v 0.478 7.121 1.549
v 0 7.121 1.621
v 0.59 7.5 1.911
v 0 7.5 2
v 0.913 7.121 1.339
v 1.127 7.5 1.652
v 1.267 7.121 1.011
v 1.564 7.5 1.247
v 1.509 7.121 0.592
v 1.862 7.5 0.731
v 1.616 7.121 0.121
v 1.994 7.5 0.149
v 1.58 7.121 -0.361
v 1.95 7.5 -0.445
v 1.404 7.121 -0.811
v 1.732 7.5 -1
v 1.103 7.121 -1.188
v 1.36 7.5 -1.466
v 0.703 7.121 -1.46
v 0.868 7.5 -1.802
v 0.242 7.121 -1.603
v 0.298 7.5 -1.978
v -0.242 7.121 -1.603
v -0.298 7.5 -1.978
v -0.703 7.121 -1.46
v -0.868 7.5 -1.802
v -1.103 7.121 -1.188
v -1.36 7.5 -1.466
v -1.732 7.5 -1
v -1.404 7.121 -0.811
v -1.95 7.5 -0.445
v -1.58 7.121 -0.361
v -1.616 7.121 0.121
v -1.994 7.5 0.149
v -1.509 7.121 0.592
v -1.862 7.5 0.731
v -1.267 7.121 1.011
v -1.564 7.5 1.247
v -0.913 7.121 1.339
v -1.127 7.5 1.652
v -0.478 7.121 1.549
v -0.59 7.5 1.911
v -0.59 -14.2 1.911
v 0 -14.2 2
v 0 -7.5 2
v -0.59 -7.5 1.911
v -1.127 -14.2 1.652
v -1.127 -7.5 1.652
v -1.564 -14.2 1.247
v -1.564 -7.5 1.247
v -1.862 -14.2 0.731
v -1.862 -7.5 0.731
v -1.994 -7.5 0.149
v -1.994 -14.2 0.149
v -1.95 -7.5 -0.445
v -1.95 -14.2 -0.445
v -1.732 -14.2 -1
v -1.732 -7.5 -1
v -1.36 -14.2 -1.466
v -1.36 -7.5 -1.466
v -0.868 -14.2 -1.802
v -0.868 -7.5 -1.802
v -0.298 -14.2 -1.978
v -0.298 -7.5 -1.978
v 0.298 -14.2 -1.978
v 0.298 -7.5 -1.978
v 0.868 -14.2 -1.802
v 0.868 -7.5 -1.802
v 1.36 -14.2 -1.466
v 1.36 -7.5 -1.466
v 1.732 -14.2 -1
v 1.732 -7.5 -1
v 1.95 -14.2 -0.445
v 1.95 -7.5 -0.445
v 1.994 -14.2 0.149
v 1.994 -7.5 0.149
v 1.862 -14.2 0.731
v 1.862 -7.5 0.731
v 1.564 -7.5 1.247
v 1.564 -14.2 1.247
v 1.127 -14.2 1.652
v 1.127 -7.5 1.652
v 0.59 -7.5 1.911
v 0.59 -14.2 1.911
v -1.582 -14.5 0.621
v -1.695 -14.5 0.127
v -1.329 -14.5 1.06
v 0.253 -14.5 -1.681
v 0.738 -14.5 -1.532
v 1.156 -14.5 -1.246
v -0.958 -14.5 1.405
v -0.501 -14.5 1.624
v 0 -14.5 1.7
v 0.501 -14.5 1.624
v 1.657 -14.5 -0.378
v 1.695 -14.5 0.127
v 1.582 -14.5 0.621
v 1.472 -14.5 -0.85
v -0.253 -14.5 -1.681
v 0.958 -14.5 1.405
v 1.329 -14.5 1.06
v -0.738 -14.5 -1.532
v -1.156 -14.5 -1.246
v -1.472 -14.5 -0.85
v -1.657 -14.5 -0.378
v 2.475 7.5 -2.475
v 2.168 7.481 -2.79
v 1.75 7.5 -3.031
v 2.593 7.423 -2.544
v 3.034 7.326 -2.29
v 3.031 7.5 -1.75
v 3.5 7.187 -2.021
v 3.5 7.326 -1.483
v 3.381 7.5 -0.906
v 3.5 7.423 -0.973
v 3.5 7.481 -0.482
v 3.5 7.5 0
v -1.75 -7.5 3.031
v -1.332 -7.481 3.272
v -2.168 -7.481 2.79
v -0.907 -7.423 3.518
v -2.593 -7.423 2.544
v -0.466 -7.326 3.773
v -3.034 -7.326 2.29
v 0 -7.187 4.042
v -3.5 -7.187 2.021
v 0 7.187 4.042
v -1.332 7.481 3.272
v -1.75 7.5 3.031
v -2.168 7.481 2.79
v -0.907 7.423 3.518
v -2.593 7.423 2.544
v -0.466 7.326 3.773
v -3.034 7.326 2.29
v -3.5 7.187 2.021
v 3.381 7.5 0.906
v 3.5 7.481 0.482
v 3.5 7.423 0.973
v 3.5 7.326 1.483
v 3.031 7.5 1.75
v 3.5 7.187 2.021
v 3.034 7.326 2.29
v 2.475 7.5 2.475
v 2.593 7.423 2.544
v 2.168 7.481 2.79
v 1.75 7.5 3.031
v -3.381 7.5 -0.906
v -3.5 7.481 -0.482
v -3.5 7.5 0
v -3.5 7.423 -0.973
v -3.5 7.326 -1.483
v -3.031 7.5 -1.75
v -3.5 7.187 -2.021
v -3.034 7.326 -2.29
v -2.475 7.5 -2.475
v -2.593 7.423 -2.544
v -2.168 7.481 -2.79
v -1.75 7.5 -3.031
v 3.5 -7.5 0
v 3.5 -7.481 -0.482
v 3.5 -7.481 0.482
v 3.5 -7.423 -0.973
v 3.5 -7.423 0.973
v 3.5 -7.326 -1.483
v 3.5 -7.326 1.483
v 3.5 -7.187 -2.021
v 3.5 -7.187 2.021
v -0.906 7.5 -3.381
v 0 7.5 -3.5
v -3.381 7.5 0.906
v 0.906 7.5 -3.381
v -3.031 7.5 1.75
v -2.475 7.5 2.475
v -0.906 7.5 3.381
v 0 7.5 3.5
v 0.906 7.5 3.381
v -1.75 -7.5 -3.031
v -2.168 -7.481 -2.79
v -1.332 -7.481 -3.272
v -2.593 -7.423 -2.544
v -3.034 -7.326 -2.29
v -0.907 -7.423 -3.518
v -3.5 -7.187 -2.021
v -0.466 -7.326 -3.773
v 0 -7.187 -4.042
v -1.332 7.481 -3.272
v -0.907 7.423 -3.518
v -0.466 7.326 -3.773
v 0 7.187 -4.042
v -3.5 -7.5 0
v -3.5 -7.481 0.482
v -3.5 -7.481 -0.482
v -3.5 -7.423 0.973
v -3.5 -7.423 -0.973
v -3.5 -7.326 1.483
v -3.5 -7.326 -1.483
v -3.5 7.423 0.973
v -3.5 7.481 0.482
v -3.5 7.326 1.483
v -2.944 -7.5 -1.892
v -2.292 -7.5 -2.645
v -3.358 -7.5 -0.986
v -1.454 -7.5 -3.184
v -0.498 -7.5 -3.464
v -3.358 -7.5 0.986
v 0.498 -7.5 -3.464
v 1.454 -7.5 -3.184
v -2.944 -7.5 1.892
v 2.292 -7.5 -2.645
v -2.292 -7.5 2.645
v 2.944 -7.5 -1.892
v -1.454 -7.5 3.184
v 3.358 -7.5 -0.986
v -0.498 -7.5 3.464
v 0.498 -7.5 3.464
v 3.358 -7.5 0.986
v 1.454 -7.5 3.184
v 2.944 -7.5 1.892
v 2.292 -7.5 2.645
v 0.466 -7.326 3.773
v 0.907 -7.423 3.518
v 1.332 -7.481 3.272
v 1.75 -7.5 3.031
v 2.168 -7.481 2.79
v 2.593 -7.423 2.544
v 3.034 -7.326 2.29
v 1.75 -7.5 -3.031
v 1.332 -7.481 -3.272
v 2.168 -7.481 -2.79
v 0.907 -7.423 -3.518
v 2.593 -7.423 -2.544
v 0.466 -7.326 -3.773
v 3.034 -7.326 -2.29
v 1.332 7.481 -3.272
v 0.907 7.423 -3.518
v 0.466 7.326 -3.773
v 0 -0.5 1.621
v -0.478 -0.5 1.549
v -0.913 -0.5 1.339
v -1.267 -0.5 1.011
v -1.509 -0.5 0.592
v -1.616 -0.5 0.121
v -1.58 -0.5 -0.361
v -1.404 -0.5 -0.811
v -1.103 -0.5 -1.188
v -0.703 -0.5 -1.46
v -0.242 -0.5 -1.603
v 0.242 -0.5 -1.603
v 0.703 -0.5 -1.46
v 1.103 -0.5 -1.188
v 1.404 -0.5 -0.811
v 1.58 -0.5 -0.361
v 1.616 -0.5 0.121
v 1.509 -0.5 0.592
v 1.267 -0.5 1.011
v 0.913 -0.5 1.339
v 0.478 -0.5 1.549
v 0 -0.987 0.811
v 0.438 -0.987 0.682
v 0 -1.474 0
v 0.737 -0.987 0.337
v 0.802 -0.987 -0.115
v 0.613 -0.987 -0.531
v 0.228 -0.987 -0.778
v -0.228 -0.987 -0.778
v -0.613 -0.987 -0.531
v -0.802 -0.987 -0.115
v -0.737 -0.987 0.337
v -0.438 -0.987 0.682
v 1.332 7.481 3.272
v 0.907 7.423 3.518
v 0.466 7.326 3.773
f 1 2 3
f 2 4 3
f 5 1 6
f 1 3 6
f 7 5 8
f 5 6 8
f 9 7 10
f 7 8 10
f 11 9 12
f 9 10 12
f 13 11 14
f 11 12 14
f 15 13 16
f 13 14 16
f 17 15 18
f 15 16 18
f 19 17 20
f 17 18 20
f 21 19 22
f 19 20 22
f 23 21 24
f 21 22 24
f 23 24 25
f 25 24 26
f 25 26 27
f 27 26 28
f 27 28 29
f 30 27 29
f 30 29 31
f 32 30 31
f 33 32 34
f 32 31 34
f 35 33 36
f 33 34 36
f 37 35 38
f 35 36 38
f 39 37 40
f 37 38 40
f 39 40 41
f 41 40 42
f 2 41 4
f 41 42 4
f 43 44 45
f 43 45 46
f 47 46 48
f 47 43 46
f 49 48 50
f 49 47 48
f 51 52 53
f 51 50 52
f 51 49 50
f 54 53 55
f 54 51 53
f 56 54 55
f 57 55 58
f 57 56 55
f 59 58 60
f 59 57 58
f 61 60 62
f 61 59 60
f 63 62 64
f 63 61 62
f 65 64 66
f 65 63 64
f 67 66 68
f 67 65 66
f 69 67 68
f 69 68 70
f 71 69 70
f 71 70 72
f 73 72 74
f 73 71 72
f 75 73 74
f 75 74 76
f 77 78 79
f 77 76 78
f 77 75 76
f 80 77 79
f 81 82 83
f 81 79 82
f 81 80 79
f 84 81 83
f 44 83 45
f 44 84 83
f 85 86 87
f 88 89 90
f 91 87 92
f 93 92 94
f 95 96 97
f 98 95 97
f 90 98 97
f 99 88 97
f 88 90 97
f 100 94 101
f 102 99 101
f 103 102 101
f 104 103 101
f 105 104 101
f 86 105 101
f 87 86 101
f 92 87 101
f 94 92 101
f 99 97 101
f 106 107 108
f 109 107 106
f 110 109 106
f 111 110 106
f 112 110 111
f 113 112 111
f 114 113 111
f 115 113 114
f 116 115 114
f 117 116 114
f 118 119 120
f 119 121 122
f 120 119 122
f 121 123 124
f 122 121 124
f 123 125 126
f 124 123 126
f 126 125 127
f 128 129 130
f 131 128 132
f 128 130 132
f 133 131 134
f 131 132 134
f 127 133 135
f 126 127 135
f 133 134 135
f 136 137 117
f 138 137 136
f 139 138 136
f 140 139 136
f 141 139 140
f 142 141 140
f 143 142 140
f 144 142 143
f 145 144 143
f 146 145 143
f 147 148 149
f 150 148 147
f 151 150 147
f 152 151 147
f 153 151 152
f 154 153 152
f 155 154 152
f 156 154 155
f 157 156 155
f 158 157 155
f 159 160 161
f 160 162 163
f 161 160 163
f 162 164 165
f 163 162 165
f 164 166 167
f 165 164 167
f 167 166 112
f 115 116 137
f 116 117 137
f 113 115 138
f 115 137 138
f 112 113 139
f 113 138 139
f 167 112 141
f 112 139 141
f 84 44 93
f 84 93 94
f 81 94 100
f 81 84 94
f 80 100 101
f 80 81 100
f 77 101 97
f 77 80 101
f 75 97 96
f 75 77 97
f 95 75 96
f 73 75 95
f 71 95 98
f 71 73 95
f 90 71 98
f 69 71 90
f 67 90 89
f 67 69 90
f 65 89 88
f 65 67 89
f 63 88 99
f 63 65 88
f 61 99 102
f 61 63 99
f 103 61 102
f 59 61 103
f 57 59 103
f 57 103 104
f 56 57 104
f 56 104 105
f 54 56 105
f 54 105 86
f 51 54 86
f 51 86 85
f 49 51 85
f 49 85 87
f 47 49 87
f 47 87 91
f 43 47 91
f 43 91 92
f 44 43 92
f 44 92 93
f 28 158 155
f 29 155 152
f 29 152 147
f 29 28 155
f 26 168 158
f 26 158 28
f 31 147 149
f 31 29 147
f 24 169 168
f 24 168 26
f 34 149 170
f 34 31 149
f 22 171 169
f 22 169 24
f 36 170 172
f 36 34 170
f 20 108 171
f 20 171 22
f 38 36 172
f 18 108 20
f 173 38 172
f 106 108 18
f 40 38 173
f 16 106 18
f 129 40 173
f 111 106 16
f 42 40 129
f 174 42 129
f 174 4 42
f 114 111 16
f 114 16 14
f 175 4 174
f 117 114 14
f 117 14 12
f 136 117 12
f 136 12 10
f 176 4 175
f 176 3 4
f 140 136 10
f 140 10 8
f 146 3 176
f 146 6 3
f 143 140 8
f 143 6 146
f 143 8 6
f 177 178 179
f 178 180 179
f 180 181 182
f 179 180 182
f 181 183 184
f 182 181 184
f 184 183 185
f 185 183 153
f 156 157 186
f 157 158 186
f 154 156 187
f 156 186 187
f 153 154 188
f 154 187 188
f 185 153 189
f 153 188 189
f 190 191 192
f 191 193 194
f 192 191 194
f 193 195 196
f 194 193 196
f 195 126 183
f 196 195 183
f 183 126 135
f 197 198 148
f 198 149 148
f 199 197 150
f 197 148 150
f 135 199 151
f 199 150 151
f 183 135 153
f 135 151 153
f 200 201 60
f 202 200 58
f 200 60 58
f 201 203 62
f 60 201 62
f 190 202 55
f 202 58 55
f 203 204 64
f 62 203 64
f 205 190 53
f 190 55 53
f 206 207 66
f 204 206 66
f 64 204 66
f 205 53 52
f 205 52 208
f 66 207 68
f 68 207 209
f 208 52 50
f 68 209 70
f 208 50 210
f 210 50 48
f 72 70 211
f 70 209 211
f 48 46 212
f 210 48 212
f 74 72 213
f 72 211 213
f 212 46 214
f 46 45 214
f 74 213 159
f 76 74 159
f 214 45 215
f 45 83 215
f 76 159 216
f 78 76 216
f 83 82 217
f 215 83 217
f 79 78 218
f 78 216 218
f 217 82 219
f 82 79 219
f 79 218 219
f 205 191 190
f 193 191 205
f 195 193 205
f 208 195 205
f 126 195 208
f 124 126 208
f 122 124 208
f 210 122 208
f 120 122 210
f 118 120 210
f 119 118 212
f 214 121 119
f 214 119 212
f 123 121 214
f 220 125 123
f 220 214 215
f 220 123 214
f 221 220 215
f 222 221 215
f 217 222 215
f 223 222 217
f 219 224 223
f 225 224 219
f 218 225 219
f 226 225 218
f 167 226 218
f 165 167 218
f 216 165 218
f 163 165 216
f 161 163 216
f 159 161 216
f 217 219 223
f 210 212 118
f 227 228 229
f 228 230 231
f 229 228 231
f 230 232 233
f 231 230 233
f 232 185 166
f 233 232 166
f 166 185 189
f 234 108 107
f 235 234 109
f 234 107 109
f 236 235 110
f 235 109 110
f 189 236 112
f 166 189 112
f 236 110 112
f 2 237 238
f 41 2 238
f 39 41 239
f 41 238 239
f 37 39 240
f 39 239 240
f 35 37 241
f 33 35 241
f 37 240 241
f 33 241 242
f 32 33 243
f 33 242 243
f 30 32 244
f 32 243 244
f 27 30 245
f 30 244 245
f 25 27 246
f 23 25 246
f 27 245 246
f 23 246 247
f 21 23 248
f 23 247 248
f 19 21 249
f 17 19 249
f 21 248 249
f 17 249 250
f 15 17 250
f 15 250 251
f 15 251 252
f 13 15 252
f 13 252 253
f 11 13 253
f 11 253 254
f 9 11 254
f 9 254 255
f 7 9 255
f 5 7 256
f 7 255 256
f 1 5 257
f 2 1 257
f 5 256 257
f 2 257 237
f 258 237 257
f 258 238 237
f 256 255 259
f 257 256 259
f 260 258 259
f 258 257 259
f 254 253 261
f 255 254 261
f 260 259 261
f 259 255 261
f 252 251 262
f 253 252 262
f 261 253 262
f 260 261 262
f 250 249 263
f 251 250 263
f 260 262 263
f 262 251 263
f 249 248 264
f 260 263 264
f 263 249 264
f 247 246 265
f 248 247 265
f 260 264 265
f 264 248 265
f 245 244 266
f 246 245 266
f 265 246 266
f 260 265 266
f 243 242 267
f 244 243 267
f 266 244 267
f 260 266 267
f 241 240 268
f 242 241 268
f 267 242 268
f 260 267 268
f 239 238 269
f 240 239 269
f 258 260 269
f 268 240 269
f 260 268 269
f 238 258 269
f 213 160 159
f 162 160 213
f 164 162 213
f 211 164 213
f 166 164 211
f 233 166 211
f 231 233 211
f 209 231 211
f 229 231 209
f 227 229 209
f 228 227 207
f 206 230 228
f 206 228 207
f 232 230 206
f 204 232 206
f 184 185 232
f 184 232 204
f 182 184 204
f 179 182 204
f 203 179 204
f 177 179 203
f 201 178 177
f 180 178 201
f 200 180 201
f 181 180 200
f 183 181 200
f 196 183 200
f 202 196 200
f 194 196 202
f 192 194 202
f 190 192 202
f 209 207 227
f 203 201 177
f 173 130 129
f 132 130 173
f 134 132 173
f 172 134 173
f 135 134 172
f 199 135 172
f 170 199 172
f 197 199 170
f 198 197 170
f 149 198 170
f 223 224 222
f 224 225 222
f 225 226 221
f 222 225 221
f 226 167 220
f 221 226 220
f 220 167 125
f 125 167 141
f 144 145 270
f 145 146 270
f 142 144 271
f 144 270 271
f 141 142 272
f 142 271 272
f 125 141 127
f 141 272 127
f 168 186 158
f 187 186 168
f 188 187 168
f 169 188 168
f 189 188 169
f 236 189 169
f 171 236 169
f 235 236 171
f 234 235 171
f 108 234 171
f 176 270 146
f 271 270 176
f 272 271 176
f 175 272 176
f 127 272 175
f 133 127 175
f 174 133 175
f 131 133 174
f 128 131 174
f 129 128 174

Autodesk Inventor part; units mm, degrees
ref_plane "YZ Plane" through (0, 0, 0) normal (1, 0, 0) x (0, 1, 0)
ref_plane "XZ Plane" through (0, 0, 0) normal (0, 1, 0) x (-1, 0, 0)
ref_plane "XY Plane" through (0, 0, 0) normal (0, 0, 1) x (1, 0, 0)
sketch "スケッチ1" plane through (0, 0, 0) normal (1, 0, 0) x (0, 1, 0)
  line L0 (-7.5, 0) -> (7.5, 0)
  line L1 (0, 0) -> (0, 4.0415) construction
  line L2 (-7.1874, 4.0415) -> (-7.5, 3.5)
  line L3 (-7.5, 3.5) -> (-7.5, 0)
  line L4 (-7.1874, 4.0415) -> (7.1874, 4.0415)
  line L5 (7.1874, 4.0415) -> (7.5, 3.5)
  line L6 (7.5, 3.5) -> (7.5, 0)
  line L7 (-7.5, 2) -> (-14.2, 2)
  line L8 (-14.5, 1.7) -> (-14.5, 0)
  line L9 (-14.5, 0) -> (-7.5, 0)
  line L10 (-14.2, 2) -> (-14.5, 1.7)
  point P0 (7.5, 1.5)
  point P1 (-14.5, 2)
  dimension "d1" = 3.5
  dimension "d2" = 4.0415
  dimension "d3" = 30
  dimension "d4" = 15
  dimension "d18" = 7
  dimension "d19" = 4
  dimension "d22" = 0.3
  dimension "d23" = 0.3
revolve "回転1" add sketch "スケッチ1" angle 360 about axis through (0, -7.5, 0) along (0, 1, 0)
sketch "スケッチ2" plane through (0, 7.5, 0) normal (0, 1, 0) x (1, 0, 0)
  line L0 (0, -4.0415) -> (-3.5, -2.0207)
  line L1 (-3.5, -2.0207) -> (-3.5, 2.0207)
  line L2 (-3.5, 2.0207) -> (0, 4.0415)
  line L3 (0, 4.0415) -> (3.5, 2.0207)
  line L4 (3.5, 2.0207) -> (3.5, -2.0207)
  line L5 (3.5, -2.0207) -> (0, -4.0415)
  circle A0 centre (0, 0) radius 4.0415 projected
  point P0 (0, 0)
  point P1 (0, 0)
  point P2 (3.5, 2.0207)
  point P3 (3.5, 2.0207)
  point P4 (0, 4.0415)
  point P5 (0, 4.0415)
  point P6 (-3.5, 2.0207)
  point P7 (-3.5, 2.0207)
  point P8 (-3.5, -2.0207)
  point P9 (3.5, -2.0207)
  point P10 (3.5, -2.0207)
extrude "押し出し1" cut sketch "スケッチ2" against normal through all contours A0 L0 | L5 A0 | A0 L1 | L4 A0 | A0 L2 | L3 A0
hole "穴1" at (0, 7.5, 0) direction (0, -1, 0) diameter 3.242 depth 8 tip angle 118 countersink diameter 4 countersink angle 90 thread size "M4x0.7" class "6H" standard "ISO Metric profile"
thread "ねじ1" size "M4x0.7" class "6g" standard "ANSI Metric M Profile" full length
equation "\"d2\" = 1.1547 * d1"
equation "\"d23\" = d22"
properties part number "BSL-415BE" material "アルミニウム 2014-T4"
